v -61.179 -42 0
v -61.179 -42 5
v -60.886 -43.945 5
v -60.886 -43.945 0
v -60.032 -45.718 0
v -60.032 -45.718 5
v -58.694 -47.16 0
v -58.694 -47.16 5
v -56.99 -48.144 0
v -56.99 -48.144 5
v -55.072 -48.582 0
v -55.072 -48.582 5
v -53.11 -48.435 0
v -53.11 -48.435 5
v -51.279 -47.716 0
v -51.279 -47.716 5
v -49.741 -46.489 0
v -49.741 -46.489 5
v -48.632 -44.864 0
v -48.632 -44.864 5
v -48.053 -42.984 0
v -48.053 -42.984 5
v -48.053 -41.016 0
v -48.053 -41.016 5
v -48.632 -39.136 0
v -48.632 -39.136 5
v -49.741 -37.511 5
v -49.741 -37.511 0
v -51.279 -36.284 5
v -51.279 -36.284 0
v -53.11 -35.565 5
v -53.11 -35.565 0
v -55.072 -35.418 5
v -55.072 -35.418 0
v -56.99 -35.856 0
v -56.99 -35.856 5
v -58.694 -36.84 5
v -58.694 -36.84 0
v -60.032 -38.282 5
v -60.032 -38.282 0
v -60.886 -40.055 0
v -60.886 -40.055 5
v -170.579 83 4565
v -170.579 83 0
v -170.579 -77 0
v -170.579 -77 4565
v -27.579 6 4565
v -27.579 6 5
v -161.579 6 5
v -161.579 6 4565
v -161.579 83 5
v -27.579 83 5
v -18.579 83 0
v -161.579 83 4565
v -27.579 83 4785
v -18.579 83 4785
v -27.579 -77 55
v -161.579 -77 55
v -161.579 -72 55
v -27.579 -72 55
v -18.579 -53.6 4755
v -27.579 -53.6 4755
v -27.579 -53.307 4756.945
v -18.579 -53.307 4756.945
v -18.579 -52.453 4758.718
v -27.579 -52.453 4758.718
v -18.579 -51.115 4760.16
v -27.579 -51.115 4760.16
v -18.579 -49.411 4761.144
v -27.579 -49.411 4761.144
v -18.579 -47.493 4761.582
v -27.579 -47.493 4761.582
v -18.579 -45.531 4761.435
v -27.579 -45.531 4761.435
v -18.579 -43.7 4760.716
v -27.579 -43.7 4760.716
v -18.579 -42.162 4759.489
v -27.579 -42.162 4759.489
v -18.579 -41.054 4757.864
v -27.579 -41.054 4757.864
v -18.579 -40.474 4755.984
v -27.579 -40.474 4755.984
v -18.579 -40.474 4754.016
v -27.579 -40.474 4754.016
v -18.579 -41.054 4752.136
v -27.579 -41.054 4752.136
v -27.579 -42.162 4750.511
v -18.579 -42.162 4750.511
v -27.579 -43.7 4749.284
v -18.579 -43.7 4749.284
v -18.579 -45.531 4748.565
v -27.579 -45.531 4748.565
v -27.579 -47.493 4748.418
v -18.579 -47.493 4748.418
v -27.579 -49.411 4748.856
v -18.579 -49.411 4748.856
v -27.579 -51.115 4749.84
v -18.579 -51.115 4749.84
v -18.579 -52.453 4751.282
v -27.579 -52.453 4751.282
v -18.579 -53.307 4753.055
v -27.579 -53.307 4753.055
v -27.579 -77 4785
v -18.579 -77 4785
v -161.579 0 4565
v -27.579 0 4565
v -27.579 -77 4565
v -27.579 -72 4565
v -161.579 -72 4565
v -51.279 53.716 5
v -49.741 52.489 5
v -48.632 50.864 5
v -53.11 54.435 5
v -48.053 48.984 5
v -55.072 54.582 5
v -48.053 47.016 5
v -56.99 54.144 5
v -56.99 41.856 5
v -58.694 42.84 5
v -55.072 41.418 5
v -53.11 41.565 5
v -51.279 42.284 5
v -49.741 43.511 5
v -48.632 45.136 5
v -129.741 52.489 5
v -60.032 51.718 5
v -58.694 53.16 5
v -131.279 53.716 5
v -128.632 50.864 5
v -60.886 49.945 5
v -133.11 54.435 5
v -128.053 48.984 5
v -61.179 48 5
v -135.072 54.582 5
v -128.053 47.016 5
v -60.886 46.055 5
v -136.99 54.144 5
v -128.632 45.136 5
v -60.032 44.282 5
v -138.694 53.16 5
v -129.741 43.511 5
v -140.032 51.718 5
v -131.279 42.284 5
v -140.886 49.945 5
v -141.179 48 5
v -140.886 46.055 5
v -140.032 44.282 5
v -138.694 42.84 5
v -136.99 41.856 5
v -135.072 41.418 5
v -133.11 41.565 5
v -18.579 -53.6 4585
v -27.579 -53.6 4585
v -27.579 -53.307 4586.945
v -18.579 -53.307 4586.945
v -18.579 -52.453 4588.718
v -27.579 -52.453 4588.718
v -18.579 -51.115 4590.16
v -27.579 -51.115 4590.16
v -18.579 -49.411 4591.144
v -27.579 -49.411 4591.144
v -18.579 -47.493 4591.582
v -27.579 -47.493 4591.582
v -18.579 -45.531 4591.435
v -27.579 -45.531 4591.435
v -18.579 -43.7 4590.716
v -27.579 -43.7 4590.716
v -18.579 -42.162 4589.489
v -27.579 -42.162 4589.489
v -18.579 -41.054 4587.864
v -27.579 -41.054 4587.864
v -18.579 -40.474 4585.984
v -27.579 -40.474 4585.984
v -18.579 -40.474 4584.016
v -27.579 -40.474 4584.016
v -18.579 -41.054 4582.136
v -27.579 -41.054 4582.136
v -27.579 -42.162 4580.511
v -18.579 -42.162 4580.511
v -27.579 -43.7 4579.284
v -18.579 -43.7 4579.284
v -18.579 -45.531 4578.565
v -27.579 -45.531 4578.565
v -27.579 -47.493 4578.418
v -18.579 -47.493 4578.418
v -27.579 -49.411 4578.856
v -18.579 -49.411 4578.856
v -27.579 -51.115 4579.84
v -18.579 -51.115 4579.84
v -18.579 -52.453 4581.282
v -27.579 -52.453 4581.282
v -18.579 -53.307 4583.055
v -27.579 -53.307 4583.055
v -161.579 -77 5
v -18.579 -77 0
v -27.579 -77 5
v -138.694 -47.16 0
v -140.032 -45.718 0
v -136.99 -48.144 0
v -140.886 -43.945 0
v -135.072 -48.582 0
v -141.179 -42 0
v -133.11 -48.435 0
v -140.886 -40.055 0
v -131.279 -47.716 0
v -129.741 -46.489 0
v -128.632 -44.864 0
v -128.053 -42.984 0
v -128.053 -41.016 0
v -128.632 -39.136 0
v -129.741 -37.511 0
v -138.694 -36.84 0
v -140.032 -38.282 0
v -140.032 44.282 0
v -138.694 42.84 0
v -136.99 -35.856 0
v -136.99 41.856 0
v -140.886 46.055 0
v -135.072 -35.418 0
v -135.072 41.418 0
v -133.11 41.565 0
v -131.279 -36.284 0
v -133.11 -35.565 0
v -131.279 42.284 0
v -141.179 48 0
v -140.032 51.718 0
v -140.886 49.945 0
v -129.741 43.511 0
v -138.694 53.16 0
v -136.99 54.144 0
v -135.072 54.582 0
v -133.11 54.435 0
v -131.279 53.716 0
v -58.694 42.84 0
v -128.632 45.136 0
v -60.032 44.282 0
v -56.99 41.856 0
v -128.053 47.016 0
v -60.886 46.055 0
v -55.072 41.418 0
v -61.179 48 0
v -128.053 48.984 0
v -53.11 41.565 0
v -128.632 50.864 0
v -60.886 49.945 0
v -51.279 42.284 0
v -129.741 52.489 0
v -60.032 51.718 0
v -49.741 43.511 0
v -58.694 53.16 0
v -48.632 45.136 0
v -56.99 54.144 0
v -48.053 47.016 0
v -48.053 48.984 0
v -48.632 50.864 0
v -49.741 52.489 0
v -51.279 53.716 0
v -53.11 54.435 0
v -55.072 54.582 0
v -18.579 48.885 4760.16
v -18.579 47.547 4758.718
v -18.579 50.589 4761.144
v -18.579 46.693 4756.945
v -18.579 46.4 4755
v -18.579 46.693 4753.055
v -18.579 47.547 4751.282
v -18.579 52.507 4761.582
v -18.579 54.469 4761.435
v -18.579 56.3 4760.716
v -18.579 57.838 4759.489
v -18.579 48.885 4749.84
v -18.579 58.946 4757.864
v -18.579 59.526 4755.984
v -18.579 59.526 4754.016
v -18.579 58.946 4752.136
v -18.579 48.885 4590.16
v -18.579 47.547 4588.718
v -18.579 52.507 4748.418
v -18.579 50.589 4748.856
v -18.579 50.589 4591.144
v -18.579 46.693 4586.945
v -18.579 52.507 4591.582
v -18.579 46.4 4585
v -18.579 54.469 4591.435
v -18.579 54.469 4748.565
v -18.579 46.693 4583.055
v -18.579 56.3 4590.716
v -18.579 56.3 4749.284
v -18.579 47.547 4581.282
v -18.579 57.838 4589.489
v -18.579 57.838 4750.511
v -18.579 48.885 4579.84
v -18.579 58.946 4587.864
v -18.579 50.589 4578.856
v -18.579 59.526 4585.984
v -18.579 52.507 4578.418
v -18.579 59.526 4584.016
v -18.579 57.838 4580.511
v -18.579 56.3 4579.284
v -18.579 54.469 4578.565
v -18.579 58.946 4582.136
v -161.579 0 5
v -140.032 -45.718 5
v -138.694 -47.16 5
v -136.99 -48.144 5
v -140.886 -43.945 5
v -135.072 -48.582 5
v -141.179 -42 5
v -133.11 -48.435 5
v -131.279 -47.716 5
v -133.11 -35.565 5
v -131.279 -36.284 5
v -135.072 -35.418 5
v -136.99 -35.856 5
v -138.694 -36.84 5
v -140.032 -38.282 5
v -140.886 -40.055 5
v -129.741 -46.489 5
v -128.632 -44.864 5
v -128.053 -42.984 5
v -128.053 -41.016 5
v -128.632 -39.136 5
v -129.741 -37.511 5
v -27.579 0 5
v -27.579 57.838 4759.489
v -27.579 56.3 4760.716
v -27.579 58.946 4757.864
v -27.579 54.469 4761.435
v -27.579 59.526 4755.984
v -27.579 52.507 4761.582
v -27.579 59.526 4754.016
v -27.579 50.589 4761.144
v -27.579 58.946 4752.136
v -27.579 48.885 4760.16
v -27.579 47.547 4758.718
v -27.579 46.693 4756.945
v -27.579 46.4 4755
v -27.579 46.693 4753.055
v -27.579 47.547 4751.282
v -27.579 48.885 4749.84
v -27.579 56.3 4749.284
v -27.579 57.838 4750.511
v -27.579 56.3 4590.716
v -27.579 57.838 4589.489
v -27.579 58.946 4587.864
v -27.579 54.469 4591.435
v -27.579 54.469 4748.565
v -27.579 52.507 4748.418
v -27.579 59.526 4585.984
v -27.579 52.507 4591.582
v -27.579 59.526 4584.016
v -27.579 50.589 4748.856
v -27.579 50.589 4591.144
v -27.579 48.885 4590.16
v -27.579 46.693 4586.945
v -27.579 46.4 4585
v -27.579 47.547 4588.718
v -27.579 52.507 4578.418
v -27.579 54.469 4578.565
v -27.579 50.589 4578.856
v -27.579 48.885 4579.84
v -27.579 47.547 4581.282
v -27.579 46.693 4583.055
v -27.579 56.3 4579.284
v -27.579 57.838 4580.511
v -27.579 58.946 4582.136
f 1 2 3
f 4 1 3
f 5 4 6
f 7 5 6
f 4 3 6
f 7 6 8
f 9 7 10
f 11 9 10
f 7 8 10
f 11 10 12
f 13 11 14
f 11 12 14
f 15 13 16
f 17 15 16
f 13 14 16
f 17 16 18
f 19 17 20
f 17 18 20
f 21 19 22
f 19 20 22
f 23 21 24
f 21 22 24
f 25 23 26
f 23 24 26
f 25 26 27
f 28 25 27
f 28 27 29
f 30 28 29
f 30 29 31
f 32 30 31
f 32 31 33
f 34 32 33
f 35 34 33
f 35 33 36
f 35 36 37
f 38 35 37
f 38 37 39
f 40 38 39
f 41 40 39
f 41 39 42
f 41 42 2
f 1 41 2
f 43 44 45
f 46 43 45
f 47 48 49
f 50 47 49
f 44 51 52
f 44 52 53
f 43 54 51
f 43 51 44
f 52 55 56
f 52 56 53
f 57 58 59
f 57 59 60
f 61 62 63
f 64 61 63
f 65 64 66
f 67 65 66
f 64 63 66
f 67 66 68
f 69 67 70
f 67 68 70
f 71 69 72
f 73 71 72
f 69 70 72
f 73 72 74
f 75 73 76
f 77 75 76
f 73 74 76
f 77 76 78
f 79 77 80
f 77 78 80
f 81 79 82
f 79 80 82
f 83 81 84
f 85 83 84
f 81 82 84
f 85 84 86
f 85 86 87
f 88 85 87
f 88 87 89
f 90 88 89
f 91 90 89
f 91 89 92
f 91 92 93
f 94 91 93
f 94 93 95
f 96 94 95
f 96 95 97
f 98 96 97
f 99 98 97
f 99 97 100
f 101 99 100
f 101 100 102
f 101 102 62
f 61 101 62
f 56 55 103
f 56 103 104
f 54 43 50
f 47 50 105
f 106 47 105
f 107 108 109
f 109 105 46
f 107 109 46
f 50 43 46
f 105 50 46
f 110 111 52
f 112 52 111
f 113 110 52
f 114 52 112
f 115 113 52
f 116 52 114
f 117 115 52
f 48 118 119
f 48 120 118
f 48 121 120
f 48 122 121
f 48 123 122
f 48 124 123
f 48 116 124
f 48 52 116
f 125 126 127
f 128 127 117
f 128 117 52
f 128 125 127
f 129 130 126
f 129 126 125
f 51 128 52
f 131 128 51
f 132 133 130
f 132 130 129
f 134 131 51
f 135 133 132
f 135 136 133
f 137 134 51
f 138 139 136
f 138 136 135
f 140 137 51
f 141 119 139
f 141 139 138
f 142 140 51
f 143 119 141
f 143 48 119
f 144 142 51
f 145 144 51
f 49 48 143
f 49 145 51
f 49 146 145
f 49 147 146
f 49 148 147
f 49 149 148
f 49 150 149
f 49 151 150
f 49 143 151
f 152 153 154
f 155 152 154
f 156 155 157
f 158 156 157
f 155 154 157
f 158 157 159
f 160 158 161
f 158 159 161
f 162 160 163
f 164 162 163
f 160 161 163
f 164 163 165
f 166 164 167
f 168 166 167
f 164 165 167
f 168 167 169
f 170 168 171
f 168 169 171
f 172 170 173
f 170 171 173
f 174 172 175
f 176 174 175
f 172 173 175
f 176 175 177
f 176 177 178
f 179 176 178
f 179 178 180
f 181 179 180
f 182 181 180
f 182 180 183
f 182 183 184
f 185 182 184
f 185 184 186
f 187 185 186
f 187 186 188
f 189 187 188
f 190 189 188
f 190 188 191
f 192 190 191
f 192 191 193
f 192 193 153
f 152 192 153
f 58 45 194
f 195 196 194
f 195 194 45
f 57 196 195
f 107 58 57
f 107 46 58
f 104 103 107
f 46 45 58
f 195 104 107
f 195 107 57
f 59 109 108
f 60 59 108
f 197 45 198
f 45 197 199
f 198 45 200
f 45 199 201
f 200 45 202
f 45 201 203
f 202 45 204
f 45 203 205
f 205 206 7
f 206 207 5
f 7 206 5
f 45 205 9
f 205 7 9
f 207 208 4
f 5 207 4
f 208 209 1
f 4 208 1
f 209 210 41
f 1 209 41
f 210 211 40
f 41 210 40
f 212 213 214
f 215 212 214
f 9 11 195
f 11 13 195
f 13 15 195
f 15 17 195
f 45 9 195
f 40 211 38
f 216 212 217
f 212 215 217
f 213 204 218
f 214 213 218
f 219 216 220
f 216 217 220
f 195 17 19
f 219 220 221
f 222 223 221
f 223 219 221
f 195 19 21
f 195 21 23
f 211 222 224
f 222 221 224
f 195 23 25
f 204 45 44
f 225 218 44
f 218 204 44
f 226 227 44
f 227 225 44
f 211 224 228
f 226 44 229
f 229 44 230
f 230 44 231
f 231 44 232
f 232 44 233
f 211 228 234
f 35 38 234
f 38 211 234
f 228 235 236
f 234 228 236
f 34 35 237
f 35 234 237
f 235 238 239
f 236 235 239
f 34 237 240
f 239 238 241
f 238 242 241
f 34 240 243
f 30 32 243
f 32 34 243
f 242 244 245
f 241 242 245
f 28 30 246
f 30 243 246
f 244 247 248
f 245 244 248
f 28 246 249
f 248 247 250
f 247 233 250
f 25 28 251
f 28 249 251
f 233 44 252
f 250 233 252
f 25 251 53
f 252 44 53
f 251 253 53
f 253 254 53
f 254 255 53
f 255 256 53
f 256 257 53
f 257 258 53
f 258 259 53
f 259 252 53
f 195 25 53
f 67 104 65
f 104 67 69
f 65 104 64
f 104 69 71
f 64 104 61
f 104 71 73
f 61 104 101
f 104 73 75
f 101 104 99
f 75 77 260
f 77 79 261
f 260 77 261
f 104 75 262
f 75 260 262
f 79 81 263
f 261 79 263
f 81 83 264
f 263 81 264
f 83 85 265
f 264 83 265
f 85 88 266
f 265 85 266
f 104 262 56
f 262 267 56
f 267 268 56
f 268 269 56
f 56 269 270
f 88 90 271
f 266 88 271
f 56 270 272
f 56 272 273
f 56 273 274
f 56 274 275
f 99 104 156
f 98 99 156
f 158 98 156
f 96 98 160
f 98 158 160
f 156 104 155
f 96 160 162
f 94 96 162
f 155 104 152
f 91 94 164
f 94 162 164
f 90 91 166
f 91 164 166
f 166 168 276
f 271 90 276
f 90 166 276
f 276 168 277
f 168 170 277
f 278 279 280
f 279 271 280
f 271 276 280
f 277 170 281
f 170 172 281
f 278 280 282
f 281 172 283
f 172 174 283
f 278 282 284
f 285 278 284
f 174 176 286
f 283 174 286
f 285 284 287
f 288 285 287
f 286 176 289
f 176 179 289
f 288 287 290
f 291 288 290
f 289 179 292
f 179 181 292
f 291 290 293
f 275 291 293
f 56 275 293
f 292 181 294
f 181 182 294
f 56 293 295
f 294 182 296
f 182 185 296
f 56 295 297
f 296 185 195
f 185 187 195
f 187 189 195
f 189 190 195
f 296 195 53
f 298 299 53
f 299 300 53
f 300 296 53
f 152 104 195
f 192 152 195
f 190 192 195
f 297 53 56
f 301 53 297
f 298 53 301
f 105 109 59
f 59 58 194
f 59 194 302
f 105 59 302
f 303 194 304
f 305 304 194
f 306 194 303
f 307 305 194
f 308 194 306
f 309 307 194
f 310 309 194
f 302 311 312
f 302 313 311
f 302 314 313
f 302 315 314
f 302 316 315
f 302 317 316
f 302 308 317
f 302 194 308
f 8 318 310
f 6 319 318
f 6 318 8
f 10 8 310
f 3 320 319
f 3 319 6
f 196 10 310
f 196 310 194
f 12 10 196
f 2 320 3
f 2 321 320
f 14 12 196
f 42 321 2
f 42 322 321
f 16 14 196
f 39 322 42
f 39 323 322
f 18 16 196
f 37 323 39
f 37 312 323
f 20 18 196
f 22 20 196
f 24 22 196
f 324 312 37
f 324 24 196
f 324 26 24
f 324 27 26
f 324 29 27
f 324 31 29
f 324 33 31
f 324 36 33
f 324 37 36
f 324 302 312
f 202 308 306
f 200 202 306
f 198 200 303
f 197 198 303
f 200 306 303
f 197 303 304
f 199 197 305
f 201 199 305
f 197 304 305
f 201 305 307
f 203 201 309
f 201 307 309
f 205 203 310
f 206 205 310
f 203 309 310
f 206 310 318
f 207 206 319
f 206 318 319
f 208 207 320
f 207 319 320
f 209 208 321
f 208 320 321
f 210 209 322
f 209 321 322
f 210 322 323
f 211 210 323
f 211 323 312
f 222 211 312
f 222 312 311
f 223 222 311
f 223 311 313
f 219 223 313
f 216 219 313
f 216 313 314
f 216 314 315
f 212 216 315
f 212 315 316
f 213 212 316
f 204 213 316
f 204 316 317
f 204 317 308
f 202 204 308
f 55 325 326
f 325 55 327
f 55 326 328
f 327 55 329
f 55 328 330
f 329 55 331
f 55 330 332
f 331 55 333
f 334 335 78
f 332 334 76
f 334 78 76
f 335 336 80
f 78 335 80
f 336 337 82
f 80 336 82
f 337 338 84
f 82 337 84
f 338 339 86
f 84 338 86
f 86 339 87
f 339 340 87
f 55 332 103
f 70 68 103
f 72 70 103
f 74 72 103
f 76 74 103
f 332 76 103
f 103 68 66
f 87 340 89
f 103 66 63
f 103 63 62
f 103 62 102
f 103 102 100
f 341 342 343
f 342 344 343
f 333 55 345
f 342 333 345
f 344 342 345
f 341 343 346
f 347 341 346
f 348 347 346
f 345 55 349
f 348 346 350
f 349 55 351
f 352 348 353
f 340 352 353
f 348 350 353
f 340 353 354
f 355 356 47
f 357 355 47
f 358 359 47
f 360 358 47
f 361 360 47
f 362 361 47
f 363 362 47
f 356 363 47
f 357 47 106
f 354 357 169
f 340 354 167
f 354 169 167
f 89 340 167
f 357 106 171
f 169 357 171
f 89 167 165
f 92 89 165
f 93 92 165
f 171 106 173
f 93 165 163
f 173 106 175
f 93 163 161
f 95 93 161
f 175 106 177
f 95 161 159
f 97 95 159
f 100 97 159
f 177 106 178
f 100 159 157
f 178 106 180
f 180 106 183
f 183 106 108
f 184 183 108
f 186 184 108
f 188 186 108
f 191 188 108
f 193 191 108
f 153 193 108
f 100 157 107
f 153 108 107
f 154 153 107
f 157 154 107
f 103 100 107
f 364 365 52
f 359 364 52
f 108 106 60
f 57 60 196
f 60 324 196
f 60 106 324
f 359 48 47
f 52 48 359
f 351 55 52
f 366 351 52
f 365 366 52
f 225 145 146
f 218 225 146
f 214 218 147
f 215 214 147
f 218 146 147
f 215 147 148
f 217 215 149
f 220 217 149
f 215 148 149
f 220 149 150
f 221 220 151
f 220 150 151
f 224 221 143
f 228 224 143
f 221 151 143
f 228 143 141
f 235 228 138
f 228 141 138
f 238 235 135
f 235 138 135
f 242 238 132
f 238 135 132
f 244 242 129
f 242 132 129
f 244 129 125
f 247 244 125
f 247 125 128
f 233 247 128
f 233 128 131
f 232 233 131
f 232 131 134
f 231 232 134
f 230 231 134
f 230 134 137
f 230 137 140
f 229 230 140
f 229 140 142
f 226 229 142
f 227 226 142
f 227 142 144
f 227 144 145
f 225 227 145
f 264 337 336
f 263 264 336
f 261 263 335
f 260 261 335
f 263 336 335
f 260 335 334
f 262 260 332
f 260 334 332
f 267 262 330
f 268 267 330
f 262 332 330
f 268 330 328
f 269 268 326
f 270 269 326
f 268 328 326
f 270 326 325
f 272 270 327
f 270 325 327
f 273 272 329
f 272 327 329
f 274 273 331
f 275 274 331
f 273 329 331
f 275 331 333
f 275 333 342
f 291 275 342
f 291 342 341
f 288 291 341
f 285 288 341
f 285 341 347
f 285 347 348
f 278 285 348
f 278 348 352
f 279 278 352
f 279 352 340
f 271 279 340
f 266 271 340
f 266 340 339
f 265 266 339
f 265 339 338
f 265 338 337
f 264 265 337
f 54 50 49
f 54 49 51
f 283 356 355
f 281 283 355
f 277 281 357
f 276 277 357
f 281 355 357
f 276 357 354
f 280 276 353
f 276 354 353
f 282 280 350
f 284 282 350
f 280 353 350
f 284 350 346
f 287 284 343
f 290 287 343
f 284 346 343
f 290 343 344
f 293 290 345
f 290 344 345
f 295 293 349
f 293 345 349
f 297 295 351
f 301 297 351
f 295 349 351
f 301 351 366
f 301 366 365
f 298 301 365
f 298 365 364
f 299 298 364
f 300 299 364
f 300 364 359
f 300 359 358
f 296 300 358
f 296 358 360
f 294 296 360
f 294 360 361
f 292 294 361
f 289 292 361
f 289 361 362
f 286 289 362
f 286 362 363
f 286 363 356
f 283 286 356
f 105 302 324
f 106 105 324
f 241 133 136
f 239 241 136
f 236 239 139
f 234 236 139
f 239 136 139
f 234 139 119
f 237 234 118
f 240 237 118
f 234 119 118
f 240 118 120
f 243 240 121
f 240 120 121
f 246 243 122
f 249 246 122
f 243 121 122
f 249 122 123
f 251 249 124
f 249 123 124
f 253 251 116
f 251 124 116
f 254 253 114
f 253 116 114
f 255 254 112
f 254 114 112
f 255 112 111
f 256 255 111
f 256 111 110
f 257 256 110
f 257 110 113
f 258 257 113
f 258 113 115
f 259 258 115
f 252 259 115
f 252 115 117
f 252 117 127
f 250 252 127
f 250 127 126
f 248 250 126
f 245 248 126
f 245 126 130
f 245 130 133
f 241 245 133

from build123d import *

# Parameters (mm, degrees)
F1_DEPTH  = 4785
F2_W      = 134
F2_H      = 220
F3_DEPTH  = 100
F4_W      = 160
F4_H      = 220
F5_DEPTH  = 25
F7_D      = 13.2
F8_W      = 134
F8_H      = 5
F9_DEPTH  = 77
F10_W     = 134
F10_H     = 5
F11_DEPTH = 77
F13_D     = 13.2
F14_W     = 134
F14_H     = 4510
F15_DEPTH = 5


with BuildPart() as f1:
    # F0 (on Top) → F1 (new body)
    with BuildSketch(Plane.XY):
        Polygon((-170.5788427117, 83), (-170.5788427117, -77), (-161.5788427117, -77), (-161.5788427117, 0), (-27.5788427117, 0), (-27.5788427117, -77), (-18.5788427117, -77), (-18.5788427117, 83), (-27.5788427117, 83), (-27.5788427117, 6), (-161.5788427117, 6), (-161.5788427117, 83), align=None)
    extrude(amount=F1_DEPTH)

    # F2 (on face) → F3 (cut)
    with BuildSketch(Plane.XZ):
        with Locations((-94.5788427117, 4675)):
            Rectangle(F2_W, F2_H)
    extrude(amount=-F3_DEPTH, mode=Mode.SUBTRACT)

    # F4 (on face) → F5 (cut)
    with BuildSketch(Plane(origin=(-170.5788427117, 0, 0), x_dir=(0, -1, 0), z_dir=(-1, 0, 0))):
        with Locations((-3, 4675)):
            Rectangle(F4_W, F4_H)
    extrude(amount=-F5_DEPTH, mode=Mode.SUBTRACT)

    # F7 (through all)
    with Locations(Plane.YZ.offset(-18.5788427117)):
        with Locations((-47, 4755), (53, 4755), (-47, 4585), (53, 4585)):
            Hole(F7_D / 2)

    # F8 (on face) → F9 (join)
    with BuildSketch(Plane(origin=(0, 6, 0), x_dir=(-1, 0, 0), z_dir=(0, 1, 0))):
        with Locations((94.5788427117, 2.5)):
            Rectangle(F8_W, F8_H)
    extrude(amount=F9_DEPTH)

    # F10 (on face) → F11 (join)
    with BuildSketch(Plane.XZ):
        with Locations((-94.5788427117, 2.5)):
            Rectangle(F10_W, F10_H)
    extrude(amount=F11_DEPTH)

    # F13 (through all)
    with Locations(Plane(origin=(0, 0, 0), x_dir=(1, 0, 0), z_dir=(0, 0, -1))):
        with Locations((-54.5788427117, -48), (-54.5788427117, 42), (-134.5788427117, 42), (-134.5788427117, -48)):
            Hole(F13_D / 2)

    # F14 (on face) → F15 (join)
    with BuildSketch(Plane.XZ.offset(77)):
        with Locations((-94.5788427117, 2310)):
            Rectangle(F14_W, F14_H)
    extrude(amount=-F15_DEPTH)


solid = f1.part
